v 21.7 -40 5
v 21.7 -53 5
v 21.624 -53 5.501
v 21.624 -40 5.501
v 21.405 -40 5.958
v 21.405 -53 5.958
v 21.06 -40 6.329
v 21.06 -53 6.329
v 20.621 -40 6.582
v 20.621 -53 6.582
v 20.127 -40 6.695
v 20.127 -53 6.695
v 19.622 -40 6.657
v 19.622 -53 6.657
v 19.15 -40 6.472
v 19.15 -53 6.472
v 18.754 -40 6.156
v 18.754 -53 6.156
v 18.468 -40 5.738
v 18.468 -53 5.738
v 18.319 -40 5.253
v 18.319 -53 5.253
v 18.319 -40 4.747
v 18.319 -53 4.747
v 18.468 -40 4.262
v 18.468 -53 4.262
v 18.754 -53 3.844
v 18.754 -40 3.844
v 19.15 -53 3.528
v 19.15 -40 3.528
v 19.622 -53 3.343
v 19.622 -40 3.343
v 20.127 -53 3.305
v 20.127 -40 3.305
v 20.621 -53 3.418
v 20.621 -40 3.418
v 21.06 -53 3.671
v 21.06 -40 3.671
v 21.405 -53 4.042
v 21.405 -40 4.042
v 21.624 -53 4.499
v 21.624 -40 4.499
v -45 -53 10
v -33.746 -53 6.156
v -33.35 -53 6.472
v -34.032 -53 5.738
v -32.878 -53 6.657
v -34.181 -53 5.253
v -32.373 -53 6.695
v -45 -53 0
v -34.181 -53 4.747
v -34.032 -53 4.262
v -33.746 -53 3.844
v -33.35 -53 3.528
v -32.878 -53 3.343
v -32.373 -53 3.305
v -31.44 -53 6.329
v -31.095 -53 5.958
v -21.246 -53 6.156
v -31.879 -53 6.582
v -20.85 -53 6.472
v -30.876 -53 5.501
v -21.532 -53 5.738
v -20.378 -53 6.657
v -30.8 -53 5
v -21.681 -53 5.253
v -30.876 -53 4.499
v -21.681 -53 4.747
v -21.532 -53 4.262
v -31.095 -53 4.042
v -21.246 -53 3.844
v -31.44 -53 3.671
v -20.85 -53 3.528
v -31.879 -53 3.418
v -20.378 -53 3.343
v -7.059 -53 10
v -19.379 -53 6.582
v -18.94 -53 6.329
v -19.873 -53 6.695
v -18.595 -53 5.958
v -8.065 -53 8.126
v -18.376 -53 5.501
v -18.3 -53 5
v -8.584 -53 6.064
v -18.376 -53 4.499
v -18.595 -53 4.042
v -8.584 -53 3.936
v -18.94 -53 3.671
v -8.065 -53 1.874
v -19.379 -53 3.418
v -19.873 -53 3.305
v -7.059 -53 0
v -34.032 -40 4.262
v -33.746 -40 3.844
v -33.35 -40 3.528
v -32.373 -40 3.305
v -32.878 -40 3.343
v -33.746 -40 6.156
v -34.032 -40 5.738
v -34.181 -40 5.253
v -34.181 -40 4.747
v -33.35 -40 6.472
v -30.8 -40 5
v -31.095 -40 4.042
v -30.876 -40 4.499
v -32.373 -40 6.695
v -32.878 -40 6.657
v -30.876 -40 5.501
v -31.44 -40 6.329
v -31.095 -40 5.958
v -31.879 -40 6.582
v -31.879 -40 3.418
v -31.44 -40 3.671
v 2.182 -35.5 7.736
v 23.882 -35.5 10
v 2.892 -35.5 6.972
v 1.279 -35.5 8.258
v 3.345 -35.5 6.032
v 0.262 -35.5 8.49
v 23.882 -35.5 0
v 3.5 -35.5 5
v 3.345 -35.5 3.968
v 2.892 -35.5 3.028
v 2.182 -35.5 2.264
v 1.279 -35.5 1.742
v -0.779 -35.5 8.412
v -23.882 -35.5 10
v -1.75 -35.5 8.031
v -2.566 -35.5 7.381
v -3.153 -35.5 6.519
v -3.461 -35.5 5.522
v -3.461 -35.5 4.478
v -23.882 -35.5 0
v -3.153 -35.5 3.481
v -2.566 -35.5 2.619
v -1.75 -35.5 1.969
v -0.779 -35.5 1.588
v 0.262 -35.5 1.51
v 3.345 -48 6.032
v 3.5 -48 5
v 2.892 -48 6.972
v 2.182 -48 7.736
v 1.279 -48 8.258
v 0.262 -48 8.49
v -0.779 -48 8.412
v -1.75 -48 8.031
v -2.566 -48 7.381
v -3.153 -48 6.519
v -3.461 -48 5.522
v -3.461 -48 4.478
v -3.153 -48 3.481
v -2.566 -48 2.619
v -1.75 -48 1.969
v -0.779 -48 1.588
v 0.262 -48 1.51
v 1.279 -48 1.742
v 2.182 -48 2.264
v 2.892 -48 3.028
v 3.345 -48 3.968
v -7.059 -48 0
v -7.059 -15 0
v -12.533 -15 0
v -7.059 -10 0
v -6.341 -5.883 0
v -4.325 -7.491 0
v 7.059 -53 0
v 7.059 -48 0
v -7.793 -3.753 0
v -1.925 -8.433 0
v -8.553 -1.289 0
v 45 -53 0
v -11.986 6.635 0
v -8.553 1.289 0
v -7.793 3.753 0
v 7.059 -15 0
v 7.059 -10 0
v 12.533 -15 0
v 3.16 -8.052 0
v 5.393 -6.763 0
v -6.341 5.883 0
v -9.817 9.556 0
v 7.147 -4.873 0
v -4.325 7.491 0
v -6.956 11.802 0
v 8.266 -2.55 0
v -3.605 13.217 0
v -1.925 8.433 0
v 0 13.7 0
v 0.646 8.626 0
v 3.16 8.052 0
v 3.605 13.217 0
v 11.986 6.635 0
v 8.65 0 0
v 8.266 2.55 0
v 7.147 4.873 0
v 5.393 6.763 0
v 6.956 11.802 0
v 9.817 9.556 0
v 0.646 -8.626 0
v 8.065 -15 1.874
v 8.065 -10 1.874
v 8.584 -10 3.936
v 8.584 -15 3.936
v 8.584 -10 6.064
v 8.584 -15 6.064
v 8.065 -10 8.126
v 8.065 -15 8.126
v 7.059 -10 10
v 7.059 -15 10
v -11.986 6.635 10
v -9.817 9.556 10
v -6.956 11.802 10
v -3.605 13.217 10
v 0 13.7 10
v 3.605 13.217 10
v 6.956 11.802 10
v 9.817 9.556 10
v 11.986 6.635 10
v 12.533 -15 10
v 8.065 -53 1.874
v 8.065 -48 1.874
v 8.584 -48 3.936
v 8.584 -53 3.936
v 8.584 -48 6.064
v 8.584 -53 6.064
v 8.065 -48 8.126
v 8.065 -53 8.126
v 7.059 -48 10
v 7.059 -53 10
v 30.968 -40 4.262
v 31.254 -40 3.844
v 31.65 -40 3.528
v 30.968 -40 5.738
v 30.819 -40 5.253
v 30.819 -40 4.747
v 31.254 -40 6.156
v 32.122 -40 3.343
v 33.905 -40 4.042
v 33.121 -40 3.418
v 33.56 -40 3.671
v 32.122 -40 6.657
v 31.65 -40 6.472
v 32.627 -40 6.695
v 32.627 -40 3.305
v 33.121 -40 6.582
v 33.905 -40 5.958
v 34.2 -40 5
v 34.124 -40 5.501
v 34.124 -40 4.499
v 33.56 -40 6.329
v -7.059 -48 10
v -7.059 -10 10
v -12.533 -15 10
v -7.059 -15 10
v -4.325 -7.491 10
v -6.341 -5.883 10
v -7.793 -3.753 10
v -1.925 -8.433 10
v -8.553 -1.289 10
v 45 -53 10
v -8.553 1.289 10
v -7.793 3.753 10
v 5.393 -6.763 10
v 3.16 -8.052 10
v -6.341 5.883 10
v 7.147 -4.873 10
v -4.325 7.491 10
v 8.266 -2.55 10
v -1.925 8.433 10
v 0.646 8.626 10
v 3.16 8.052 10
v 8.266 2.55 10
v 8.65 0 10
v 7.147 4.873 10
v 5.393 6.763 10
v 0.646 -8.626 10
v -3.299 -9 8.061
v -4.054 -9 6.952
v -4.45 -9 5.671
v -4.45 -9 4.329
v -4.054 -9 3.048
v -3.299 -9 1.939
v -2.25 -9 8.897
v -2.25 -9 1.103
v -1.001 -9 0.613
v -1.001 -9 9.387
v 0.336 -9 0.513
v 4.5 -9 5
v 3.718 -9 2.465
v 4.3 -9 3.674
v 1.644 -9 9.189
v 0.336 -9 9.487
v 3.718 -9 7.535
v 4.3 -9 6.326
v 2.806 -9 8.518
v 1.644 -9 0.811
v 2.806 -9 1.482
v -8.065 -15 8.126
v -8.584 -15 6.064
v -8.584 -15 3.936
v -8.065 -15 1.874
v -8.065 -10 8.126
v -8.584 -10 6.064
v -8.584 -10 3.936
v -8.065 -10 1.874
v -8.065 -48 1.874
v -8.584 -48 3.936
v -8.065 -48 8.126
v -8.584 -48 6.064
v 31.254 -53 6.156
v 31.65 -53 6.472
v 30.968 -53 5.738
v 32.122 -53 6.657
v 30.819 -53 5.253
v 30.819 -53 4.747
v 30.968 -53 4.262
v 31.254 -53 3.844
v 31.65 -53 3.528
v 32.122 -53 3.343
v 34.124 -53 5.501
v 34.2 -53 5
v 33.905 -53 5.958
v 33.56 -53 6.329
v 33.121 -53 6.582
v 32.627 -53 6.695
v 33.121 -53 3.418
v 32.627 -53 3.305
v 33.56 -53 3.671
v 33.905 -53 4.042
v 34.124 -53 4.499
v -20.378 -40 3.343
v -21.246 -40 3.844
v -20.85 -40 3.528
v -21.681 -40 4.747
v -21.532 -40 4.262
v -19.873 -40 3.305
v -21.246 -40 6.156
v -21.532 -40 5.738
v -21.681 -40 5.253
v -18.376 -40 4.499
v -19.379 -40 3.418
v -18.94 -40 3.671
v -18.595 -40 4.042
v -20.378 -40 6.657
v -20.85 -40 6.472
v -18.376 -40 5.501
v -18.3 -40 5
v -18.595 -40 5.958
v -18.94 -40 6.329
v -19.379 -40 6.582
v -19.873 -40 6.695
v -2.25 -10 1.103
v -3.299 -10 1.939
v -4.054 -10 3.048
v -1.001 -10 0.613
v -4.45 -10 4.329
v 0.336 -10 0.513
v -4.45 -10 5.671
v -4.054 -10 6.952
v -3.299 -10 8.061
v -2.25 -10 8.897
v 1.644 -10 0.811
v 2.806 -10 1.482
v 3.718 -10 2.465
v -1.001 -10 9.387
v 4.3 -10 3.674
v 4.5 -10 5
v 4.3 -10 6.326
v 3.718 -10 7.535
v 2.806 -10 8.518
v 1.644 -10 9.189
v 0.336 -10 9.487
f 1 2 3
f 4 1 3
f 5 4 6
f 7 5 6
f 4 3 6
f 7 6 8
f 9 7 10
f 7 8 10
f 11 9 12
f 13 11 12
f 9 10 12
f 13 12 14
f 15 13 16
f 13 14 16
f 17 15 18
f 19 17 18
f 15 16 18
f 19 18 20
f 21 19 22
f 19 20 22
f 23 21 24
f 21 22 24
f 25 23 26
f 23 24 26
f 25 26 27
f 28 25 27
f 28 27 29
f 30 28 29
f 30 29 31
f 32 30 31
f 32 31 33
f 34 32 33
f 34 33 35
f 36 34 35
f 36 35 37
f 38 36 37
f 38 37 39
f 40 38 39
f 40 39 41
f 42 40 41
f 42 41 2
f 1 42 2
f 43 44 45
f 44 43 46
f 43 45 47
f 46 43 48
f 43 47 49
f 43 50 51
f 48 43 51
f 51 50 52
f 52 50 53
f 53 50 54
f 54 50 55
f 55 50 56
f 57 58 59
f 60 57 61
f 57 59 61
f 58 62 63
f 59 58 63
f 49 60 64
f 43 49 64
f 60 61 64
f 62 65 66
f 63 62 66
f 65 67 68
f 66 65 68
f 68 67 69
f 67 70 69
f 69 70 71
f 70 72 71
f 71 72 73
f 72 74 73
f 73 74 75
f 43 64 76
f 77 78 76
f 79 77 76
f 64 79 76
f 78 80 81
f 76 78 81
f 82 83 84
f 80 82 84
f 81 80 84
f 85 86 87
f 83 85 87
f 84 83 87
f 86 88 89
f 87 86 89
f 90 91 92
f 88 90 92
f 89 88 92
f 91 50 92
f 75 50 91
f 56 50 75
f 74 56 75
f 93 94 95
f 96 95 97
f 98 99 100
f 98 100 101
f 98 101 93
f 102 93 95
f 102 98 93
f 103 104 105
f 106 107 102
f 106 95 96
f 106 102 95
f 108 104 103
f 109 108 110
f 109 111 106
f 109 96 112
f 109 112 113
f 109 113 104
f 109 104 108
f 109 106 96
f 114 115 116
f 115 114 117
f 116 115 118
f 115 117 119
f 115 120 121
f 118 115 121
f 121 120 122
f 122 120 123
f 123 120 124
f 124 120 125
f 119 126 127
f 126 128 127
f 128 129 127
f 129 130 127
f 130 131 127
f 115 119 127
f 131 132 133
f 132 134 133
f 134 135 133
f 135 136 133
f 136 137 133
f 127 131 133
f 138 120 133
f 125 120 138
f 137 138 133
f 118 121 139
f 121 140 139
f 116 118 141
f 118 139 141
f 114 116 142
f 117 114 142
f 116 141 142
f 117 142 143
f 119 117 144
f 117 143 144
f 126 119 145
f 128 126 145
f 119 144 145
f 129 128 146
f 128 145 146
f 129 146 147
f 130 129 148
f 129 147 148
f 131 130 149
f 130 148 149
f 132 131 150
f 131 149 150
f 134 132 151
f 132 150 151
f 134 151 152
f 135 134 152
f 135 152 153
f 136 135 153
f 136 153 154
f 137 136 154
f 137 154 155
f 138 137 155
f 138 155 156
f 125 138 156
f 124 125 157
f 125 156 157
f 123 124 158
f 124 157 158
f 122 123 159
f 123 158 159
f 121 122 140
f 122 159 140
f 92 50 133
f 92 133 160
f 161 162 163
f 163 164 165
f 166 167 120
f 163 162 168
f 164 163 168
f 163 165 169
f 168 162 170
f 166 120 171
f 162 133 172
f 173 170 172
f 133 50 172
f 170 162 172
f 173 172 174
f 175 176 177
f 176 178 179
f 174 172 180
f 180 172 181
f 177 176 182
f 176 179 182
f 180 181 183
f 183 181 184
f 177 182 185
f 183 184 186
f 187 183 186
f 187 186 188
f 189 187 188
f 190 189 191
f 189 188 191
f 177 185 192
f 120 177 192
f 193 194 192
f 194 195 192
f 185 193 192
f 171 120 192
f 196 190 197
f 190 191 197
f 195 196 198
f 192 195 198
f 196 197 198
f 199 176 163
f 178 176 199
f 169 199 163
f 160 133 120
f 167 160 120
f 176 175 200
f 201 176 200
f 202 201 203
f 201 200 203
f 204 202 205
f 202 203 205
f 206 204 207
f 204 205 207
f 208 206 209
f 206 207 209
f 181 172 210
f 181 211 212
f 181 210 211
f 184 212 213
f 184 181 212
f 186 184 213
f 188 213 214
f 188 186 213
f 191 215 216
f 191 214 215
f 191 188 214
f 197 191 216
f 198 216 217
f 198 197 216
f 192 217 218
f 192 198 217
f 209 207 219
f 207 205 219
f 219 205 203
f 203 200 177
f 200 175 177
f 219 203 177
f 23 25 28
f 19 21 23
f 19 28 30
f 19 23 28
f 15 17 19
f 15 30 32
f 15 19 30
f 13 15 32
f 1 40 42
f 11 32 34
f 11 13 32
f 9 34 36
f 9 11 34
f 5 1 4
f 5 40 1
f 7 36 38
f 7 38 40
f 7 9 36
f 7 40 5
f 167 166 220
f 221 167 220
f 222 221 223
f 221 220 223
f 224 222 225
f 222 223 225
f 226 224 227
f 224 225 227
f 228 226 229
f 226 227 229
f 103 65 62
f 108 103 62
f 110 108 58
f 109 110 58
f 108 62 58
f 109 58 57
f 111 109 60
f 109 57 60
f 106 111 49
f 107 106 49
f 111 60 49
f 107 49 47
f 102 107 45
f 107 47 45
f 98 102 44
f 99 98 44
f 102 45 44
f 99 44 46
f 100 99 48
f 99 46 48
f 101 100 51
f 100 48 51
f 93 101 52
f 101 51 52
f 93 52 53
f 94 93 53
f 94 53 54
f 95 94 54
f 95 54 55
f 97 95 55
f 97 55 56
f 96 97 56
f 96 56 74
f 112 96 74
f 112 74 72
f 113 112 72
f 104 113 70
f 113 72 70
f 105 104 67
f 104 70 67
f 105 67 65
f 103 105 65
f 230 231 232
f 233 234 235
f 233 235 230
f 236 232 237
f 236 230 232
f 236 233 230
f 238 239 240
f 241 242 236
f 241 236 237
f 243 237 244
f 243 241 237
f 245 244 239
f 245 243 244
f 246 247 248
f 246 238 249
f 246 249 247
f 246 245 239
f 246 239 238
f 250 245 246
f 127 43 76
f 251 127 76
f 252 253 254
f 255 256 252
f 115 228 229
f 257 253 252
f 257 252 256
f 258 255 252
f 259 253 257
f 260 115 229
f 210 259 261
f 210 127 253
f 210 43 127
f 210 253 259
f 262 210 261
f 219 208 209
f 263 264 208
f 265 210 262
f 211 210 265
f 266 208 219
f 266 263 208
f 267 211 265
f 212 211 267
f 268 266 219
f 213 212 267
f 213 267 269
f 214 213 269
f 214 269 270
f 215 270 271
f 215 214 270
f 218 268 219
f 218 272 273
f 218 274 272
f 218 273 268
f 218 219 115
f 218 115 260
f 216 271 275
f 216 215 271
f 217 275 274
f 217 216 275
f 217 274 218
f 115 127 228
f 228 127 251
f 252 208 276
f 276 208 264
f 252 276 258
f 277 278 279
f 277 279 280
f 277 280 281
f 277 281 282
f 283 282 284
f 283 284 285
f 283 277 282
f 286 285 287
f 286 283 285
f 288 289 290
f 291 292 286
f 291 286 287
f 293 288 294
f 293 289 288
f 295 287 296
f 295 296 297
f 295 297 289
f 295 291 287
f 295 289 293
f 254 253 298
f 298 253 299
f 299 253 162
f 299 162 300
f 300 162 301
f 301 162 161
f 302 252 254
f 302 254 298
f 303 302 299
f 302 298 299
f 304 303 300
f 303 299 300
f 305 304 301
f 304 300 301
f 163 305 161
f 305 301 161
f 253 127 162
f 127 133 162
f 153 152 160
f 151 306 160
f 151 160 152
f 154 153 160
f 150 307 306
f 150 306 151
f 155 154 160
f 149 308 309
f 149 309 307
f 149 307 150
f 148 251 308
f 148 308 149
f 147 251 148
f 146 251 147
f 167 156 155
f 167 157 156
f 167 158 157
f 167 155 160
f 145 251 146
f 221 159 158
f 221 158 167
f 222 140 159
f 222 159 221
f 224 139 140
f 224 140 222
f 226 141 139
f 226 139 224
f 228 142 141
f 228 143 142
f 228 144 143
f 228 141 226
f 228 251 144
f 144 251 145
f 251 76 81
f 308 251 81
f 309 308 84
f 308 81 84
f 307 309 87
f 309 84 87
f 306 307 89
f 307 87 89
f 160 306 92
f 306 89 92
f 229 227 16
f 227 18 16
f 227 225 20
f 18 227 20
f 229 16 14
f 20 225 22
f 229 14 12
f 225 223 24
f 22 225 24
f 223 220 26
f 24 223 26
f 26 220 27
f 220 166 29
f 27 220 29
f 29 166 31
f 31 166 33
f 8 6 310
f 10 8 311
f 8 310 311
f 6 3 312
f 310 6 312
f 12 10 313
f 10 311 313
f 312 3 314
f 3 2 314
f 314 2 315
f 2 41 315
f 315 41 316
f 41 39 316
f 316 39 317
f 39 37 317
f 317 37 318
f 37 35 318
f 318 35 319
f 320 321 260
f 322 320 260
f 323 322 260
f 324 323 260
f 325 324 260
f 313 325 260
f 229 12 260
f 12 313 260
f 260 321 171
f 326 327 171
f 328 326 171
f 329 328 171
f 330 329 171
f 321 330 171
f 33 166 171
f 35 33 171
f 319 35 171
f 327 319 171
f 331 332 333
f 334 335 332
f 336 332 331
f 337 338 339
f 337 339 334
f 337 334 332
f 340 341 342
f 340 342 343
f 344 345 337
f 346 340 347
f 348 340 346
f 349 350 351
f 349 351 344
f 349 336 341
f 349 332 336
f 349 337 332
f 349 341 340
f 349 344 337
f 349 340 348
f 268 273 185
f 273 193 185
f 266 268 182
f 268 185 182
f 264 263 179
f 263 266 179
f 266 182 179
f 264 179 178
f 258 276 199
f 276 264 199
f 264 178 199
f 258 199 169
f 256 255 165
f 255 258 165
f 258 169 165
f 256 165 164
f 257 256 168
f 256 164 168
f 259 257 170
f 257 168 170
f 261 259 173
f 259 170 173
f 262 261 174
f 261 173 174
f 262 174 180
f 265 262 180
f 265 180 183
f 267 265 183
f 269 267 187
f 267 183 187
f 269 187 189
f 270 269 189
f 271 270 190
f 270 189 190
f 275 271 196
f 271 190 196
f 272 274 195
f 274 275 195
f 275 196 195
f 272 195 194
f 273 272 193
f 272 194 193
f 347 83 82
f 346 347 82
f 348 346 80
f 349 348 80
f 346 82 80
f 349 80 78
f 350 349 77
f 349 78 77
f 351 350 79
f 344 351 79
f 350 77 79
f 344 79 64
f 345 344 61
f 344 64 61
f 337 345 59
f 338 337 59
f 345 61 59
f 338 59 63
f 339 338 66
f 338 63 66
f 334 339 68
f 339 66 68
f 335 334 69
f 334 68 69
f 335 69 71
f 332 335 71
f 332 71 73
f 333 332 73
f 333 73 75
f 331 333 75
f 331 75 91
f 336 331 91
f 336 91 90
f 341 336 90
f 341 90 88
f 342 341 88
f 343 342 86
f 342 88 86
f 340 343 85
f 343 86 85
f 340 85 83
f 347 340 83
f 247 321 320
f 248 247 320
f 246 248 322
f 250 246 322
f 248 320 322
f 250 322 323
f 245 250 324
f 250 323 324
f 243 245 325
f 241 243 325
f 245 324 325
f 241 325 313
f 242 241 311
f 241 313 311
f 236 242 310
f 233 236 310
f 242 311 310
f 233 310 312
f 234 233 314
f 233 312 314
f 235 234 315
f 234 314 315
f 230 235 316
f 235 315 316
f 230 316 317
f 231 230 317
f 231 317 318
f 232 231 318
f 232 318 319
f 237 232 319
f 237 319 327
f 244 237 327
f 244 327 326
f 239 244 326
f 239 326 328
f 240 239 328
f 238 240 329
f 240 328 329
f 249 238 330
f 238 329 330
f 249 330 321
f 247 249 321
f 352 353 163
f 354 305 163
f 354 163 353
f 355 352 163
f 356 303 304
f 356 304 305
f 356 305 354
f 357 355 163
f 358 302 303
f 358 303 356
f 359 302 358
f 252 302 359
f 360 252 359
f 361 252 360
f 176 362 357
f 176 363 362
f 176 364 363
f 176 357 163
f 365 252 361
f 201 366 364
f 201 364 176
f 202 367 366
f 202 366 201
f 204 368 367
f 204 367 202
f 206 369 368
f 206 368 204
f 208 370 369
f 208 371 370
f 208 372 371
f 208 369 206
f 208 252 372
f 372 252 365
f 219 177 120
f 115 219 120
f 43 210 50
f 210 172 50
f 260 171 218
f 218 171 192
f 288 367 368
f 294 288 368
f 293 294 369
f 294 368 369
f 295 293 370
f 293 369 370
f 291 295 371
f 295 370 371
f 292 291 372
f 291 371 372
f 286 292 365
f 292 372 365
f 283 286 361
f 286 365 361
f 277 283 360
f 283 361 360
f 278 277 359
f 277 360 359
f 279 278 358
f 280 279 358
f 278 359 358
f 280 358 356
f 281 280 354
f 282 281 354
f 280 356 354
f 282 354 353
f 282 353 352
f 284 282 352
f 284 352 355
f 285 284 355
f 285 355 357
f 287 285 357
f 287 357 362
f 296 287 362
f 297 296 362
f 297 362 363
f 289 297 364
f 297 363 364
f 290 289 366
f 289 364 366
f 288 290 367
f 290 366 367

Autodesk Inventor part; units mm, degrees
ref_plane "YZ Plane" through (0, 0, 0) normal (1, 0, 0) x (0, 1, 0)
ref_plane "XZ Plane" through (0, 0, 0) normal (0, 1, 0) x (-1, 0, 0)
ref_plane "XY Plane" through (0, 0, 0) normal (0, 0, 1) x (1, 0, 0)
sketch "Sketch1" plane through (0, 0, 0) normal (0, 0, 1) x (1, 0, 0)
  circle A0 centre (0, 0) radius 8.7
  arc A1 (11.985896, 6.635383) -> (-11.985896, 6.635383) centre (0, 0) ccw
  line L0 (0, 52.910691) -> (0, -52.910691) construction
  line L1 (-45, -53) -> (45, -53)
  line L2 (-45, -53) -> (-11.985896, 6.635383)
  line L3 (45, -53) -> (11.985896, 6.635383)
  line L4 (12.533127, -15) -> (23.881912, -35.5)
  line L5 (23.881912, -35.5) -> (-23.881912, -35.5)
  line L6 (-12.533127, -15) -> (12.533127, -15)
  line L7 (-23.881912, -35.5) -> (-12.533127, -15)
  circle A2 centre (0, 0) radius 8.65
  dimension "d0" = 5
  dimension "d1" = 53
  dimension "d2" = 90
  dimension "d3" = 45
  dimension "d12" = 17.5
  dimension "d13" = 15
  dimension "d15" = 10
  dimension "d16" = 10
  dimension "d41" = 17.3
sketch "Sketch1 outline for Extrusion1" plane through (0, 0, 0) normal (0, 0, 1) x (1, 0, 0)
  line L0 (-45, -53) -> (45, -53)
  line L1 (45, -53) -> (11.985896, 6.635383)
  arc A0 (11.985896, 6.635383) -> (-11.985896, 6.635383) centre (0, 0) ccw
  line L2 (-11.985896, 6.635383) -> (-45, -53)
  line L3 (12.533127, -15) -> (23.881912, -35.5)
  line L4 (23.881912, -35.5) -> (-23.881912, -35.5)
  line L5 (-23.881912, -35.5) -> (-12.533127, -15)
  line L6 (-12.533127, -15) -> (12.533127, -15)
  circle A1 centre (0, 0) radius 8.65
extrude "Extrusion1" add sketch "Sketch1 outline for Extrusion1" along normal blind 5
sketch "Sketch2" plane through (0, 0, 5) normal (0, 0, 1) x (1, 0, 0)
  line L0 (45, -53) -> (11.985896, 6.635383)
  arc A0 (11.985896, 6.635383) -> (-11.985896, 6.635383) centre (0, 0) ccw
  line L1 (-11.985896, 6.635383) -> (-45, -53)
  line L2 (-45, -53) -> (45, -53)
  line L3 (12.533127, -15) -> (23.881912, -35.5)
  line L4 (23.881912, -35.5) -> (-23.881912, -35.5)
  line L5 (-23.881912, -35.5) -> (-12.533127, -15)
  line L6 (-12.533127, -15) -> (12.533127, -15)
  line L7 (39.910172, -50) -> (9.361247, 5.182379)
  arc A1 (9.361247, 5.182379) -> (-9.361247, 5.182379) centre (0, 0) ccw
  line L8 (-9.361247, 5.182379) -> (-39.910172, -50)
  line L9 (-39.910172, -50) -> (39.910172, -50)
  line L10 (-14.301359, -12) -> (-28.97174, -38.5)
  line L11 (-28.97174, -38.5) -> (28.97174, -38.5)
  line L12 (28.97174, -38.5) -> (14.301359, -12)
  line L13 (14.301359, -12) -> (-14.301359, -12)
  circle A2 centre (0, 0) radius 8.65
  point P0 (0, 0)
  point P1 (-11.653536, 1.041678)
  point P2 (11.653536, 1.041678)
  dimension "d19" = 3
  dimension "d20" = 3
  dimension "d42" = 17.3
extrude "Extrusion2" add sketch "Sketch2" along normal blind 5 contours L2 L1 A0 L0 | L9 L8 A1 L7 | L13 L12 L11 L10
sketch "Sketch3" plane through (-45, -53, 0) normal (0, -1, 0) x (1, 0, 0)
  line L0 (45, 0) -> (45, 10) construction
  line L1 (32.466873, 10) -> (57.533127, 10) construction
  line L2 (0, 0) -> (0, 10) construction
  line L3 (0, 5) -> (90, 5) construction
  line L4 (90, 0) -> (90, 10) construction
  line L5 (33.3, 5) -> (56.7, 5) construction
  circle A0 centre (45, 5) radius 8.65
  circle A1 centre (45, 5) radius 3.5
  circle A2 centre (45, 5) radius 4.5
  circle A3 centre (77.5, 5) radius 1.7
  circle A4 centre (65, 5) radius 1.7
  circle A5 centre (12.5, 5) radius 1.7
  circle A6 centre (25, 5) radius 1.7
  point P0 (56.653536, 5)
  point P1 (33.346464, 5)
  dimension "d24" = 17.3
  dimension "d25" = 7
  dimension "d32" = 9
  dimension "d35" = 3.4
  dimension "d36" = 12.5
  dimension "d37" = 3.4
  dimension "d38" = 12.5
extrude "Extrusion3" cut sketch "Sketch3" against normal blind 5 contours A0 | A2
extrude "Extrusion4" cut sketch "Sketch3" against normal blind 43 contours A1
extrude "Extrusion5" cut sketch "Sketch3" against normal up to surface (5 mm away) from surface at -38 contours A0 | A2
extrude "Extrusion6" cut sketch "Sketch3" against normal blind 6 from surface at -38 contours A1 | A2
extrude "Extrusion7" cut sketch "Sketch3" against normal blind 13 contours A3 | A4 | A5 | A6
properties part number "96mmWheelBracket_3DPrint"
